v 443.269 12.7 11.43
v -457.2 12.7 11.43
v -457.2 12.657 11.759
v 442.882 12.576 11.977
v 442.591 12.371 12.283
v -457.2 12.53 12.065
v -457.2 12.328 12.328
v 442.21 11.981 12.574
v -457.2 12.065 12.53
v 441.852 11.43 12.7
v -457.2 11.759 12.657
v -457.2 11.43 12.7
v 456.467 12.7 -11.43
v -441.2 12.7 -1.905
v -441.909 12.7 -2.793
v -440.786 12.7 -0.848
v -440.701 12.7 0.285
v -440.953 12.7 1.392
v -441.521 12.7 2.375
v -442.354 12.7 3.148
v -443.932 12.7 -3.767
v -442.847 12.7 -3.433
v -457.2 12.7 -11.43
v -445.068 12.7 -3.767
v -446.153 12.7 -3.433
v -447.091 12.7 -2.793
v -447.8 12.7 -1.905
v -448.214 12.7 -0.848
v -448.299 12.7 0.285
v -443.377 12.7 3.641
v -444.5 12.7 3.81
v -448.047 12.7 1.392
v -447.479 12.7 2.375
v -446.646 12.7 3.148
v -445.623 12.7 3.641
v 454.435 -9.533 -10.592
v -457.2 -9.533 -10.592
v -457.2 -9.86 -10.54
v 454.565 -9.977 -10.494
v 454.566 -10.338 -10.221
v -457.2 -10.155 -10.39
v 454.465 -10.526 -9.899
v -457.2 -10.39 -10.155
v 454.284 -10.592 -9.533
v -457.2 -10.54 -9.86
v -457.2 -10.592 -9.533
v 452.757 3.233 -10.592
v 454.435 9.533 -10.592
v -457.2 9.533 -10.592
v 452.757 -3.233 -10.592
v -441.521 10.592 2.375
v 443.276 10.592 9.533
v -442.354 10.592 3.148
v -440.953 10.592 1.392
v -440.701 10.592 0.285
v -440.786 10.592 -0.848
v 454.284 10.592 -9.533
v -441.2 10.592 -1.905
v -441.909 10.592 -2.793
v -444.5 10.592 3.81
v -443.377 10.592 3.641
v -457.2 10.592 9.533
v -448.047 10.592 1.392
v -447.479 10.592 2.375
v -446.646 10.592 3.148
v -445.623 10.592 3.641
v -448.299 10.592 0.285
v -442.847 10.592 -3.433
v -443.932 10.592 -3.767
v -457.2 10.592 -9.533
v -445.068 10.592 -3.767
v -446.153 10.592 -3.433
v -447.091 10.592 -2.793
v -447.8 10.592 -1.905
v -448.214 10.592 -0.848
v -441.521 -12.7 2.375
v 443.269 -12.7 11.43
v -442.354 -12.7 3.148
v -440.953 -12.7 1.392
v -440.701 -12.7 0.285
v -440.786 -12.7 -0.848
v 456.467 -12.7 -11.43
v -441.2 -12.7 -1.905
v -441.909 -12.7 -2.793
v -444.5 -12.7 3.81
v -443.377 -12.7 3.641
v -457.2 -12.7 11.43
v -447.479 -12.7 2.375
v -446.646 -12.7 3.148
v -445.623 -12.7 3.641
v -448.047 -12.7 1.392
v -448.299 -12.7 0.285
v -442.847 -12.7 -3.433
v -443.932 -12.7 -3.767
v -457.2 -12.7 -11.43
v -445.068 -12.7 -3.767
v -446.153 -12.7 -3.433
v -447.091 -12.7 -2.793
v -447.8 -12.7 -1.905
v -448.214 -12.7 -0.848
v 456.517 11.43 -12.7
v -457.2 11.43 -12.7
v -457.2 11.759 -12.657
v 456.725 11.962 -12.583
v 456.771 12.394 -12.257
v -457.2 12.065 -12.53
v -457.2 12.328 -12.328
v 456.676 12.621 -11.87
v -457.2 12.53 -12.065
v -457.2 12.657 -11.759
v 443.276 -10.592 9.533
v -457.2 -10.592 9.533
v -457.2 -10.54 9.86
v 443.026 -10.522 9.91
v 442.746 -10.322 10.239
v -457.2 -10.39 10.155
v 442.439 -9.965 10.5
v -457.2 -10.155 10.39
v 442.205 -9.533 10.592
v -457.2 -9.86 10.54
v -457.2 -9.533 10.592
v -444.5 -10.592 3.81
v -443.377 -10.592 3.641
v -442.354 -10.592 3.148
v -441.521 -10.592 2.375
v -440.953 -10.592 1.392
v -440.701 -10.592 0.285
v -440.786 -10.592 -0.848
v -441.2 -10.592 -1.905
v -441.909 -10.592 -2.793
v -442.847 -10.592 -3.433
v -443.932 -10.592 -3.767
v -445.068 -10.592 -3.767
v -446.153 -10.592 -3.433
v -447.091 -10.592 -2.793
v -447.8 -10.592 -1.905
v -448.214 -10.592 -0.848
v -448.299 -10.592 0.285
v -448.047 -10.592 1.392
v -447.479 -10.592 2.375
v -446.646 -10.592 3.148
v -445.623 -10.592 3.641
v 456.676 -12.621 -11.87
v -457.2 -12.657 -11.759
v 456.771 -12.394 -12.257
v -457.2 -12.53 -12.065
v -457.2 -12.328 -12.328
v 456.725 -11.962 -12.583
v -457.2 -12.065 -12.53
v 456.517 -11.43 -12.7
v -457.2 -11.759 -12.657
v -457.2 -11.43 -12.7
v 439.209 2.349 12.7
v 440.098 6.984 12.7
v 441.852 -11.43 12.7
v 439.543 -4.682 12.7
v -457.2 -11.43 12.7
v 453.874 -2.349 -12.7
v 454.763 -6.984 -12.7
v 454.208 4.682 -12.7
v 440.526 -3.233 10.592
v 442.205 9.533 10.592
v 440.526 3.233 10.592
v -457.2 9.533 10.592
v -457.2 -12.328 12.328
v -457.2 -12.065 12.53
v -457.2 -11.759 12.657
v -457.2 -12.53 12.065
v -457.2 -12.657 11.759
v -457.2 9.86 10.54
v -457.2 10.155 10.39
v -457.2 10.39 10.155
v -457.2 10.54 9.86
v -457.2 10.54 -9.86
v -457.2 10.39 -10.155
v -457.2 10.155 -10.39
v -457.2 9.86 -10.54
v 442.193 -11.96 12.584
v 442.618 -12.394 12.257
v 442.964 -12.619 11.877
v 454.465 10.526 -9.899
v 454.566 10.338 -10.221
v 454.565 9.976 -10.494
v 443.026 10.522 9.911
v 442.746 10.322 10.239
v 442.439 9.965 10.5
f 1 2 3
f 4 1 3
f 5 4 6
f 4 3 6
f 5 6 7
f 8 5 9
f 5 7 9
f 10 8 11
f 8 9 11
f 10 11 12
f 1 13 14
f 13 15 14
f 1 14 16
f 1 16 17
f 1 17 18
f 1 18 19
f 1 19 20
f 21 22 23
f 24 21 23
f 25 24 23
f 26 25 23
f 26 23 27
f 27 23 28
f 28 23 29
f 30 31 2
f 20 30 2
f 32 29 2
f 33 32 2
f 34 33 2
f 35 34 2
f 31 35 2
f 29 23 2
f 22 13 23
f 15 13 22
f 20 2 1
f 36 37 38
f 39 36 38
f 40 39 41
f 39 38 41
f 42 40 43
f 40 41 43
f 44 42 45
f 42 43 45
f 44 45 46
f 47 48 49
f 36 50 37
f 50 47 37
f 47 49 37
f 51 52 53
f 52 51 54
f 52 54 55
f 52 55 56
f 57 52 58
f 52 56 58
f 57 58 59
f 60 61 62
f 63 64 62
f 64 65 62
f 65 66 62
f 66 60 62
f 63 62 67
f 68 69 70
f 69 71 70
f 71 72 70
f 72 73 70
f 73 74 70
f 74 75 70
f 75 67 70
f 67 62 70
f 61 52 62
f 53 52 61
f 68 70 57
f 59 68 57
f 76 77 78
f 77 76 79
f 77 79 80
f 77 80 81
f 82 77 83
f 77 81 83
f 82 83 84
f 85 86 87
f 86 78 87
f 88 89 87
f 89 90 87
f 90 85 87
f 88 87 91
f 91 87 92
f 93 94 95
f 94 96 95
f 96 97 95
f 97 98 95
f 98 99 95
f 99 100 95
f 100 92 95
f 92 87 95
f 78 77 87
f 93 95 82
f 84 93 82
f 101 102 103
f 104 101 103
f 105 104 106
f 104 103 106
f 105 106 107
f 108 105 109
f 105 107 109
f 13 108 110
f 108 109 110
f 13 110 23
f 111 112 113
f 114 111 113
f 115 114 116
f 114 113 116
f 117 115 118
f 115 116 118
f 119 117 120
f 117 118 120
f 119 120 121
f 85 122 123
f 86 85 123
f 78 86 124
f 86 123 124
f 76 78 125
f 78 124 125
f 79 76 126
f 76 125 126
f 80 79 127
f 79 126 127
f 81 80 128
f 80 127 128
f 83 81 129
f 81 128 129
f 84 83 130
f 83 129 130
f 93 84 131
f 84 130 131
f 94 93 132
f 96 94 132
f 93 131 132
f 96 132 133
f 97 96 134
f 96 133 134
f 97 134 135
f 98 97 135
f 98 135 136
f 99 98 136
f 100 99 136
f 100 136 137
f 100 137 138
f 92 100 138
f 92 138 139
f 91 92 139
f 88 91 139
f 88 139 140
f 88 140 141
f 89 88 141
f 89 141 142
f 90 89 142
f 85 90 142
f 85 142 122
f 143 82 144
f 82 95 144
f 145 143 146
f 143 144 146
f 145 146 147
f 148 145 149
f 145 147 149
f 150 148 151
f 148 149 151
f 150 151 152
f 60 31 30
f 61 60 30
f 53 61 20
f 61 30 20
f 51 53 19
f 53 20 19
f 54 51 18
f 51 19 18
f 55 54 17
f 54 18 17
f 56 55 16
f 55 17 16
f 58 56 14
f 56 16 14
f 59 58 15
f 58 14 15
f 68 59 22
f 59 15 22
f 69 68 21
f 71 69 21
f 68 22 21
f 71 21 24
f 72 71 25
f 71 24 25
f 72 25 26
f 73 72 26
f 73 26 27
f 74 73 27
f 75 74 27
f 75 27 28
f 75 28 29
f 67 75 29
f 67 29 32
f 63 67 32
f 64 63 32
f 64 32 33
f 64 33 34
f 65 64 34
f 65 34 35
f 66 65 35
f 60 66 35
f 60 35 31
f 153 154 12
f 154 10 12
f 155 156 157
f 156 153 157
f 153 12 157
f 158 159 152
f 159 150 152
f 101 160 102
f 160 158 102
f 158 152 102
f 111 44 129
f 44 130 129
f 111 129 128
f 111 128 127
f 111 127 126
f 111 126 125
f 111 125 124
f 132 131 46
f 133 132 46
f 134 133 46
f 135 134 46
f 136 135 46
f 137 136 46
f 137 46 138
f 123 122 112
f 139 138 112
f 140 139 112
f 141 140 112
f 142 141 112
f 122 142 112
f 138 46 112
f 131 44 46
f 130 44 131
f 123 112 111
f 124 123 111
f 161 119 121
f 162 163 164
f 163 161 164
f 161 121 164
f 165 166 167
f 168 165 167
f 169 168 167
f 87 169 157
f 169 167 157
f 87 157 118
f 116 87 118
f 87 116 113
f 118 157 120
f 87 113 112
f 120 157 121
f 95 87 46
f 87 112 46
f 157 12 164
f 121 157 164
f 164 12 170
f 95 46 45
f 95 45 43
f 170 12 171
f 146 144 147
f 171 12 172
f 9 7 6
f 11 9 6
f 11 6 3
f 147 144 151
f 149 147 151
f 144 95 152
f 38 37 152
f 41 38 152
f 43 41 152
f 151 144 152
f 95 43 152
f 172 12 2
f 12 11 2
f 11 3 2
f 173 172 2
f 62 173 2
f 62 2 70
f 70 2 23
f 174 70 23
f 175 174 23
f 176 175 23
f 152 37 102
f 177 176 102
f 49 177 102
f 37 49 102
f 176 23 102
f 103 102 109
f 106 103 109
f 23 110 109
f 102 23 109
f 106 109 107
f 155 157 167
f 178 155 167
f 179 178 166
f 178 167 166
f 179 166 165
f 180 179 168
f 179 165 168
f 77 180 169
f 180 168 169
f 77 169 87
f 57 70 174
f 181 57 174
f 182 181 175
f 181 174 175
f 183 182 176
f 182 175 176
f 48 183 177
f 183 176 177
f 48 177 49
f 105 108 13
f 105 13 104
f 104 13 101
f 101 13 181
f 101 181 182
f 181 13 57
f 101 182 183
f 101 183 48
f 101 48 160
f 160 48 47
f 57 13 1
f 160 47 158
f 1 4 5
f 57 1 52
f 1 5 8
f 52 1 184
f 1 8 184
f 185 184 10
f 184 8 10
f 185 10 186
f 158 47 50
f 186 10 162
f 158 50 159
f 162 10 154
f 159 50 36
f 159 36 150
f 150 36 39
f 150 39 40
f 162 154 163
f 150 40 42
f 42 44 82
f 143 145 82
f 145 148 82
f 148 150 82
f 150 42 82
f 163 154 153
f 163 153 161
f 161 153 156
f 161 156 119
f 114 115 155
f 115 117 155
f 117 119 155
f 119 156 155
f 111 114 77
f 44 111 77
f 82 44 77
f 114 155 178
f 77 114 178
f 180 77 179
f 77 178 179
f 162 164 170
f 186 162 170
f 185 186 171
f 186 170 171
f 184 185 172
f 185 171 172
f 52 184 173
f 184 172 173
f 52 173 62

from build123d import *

# Parameters (mm, degrees)
BOSS_EXTRUDE1_DEPTH      = 457.2
BOSS_EXTRUDE1_DEPTH_BACK = 457.2
SKETCH5_R                = 3.81
CUT_EXTRUDE1_DEPTH       = 459.081095441
CUT_EXTRUDE2_DEPTH       = 459.081095441
CUT_EXTRUDE4_DEPTH       = 618.719010665
CUT_EXTRUDE4_DEPTH_BACK  = 618.719010665


with BuildPart() as part:
    # Sketch4 → Boss-Extrude1 (new, two sides: drawn at the far end of the back side and taken through both)
    with BuildSketch(Plane(origin=(0, 0, 0), x_dir=(0, 0, -1), z_dir=(1, 0, 0)).offset(-BOSS_EXTRUDE1_DEPTH_BACK)):
        with BuildLine():
            Line((12.7, -11.43), (12.7, 11.43))
            ThreePointArc((12.7, 11.43), (12.328025612, 12.328025612), (11.43, 12.7))
            Line((11.43, 12.7), (-11.43, 12.7))
            ThreePointArc((-11.43, 12.7), (-12.328025612, 12.328025612), (-12.7, 11.43))
            Line((-12.7, 11.43), (-12.7, -11.43))
            ThreePointArc((-12.7, -11.43), (-12.328025612, -12.328025612), (-11.43, -12.7))
            Line((-11.43, -12.7), (11.43, -12.7))
            ThreePointArc((11.43, -12.7), (12.328025612, -12.328025612), (12.7, -11.43))
        make_face()
        with BuildLine():
            Line((10.5918, 9.53262), (10.5918, -9.53262))
            ThreePointArc((10.5918, -9.53262), (10.28157336, -10.28157336), (9.53262, -10.5918))
            Line((9.53262, -10.5918), (-9.53262, -10.5918))
            ThreePointArc((-9.53262, -10.5918), (-10.28157336, -10.28157336), (-10.5918, -9.53262))
            Line((-10.5918, -9.53262), (-10.5918, 9.53262))
            ThreePointArc((-10.5918, 9.53262), (-10.28157336, 10.28157336), (-9.53262, 10.5918))
            Line((-9.53262, 10.5918), (9.53262, 10.5918))
            ThreePointArc((9.53262, 10.5918), (10.28157336, 10.28157336), (10.5918, 9.53262))
        make_face(mode=Mode.SUBTRACT)
    extrude(amount=BOSS_EXTRUDE1_DEPTH + BOSS_EXTRUDE1_DEPTH_BACK)

    # Sketch5 → Cut-Extrude1 (cut, through all)
    with BuildSketch(Plane(origin=(0, 12.7, 0), x_dir=(1, 0, 0), z_dir=(0, 1, 0))):
        with Locations(Location((-444.5, 0, 0), (0, 0, 270))):
            Circle(SKETCH5_R)
    extrude(amount=-CUT_EXTRUDE1_DEPTH, mode=Mode.SUBTRACT)

    # Sketch7 → Cut-Extrude2 (cut, through all)
    with BuildSketch(Plane(origin=(0, 12.7, 0), x_dir=(1, 0, 0), z_dir=(0, 1, 0))):
        Polygon((457.2, 12.7), (442.535303163, -12.7), (457.2, -12.7), align=None)
    extrude(amount=-CUT_EXTRUDE2_DEPTH, mode=Mode.SUBTRACT)

    # Sketch8 → Cut-Extrude4 (cut, two sides: drawn at the far end of the back side and taken through both)
    with BuildSketch(Plane(origin=(119.799261314, 0, -207.498407305), x_dir=(0, 1, 0), z_dir=(0.5000000000000046, 0, -0.866025403784436)).offset(-CUT_EXTRUDE4_DEPTH_BACK)):
        with BuildLine():
            Line((1441.154483305, 1098.308705448), (12.7, 389.59681461))
            ThreePointArc((12.7, 389.59681461), (0, 386.619482961), (-12.7, 389.59681461))
            Line((-12.7, 389.59681461), (-1441.154483305, 1098.308705448))
            Line((-1441.154483305, 1098.308705448), (-1441.154483305, 4287.512214218))
            Line((-1441.154483305, 4287.512214218), (1441.154483305, 4287.512214218))
            Line((1441.154483305, 4287.512214218), (1441.154483305, 1098.308705448))
        make_face()
    extrude(amount=CUT_EXTRUDE4_DEPTH + CUT_EXTRUDE4_DEPTH_BACK, mode=Mode.SUBTRACT)


solid = part.part
